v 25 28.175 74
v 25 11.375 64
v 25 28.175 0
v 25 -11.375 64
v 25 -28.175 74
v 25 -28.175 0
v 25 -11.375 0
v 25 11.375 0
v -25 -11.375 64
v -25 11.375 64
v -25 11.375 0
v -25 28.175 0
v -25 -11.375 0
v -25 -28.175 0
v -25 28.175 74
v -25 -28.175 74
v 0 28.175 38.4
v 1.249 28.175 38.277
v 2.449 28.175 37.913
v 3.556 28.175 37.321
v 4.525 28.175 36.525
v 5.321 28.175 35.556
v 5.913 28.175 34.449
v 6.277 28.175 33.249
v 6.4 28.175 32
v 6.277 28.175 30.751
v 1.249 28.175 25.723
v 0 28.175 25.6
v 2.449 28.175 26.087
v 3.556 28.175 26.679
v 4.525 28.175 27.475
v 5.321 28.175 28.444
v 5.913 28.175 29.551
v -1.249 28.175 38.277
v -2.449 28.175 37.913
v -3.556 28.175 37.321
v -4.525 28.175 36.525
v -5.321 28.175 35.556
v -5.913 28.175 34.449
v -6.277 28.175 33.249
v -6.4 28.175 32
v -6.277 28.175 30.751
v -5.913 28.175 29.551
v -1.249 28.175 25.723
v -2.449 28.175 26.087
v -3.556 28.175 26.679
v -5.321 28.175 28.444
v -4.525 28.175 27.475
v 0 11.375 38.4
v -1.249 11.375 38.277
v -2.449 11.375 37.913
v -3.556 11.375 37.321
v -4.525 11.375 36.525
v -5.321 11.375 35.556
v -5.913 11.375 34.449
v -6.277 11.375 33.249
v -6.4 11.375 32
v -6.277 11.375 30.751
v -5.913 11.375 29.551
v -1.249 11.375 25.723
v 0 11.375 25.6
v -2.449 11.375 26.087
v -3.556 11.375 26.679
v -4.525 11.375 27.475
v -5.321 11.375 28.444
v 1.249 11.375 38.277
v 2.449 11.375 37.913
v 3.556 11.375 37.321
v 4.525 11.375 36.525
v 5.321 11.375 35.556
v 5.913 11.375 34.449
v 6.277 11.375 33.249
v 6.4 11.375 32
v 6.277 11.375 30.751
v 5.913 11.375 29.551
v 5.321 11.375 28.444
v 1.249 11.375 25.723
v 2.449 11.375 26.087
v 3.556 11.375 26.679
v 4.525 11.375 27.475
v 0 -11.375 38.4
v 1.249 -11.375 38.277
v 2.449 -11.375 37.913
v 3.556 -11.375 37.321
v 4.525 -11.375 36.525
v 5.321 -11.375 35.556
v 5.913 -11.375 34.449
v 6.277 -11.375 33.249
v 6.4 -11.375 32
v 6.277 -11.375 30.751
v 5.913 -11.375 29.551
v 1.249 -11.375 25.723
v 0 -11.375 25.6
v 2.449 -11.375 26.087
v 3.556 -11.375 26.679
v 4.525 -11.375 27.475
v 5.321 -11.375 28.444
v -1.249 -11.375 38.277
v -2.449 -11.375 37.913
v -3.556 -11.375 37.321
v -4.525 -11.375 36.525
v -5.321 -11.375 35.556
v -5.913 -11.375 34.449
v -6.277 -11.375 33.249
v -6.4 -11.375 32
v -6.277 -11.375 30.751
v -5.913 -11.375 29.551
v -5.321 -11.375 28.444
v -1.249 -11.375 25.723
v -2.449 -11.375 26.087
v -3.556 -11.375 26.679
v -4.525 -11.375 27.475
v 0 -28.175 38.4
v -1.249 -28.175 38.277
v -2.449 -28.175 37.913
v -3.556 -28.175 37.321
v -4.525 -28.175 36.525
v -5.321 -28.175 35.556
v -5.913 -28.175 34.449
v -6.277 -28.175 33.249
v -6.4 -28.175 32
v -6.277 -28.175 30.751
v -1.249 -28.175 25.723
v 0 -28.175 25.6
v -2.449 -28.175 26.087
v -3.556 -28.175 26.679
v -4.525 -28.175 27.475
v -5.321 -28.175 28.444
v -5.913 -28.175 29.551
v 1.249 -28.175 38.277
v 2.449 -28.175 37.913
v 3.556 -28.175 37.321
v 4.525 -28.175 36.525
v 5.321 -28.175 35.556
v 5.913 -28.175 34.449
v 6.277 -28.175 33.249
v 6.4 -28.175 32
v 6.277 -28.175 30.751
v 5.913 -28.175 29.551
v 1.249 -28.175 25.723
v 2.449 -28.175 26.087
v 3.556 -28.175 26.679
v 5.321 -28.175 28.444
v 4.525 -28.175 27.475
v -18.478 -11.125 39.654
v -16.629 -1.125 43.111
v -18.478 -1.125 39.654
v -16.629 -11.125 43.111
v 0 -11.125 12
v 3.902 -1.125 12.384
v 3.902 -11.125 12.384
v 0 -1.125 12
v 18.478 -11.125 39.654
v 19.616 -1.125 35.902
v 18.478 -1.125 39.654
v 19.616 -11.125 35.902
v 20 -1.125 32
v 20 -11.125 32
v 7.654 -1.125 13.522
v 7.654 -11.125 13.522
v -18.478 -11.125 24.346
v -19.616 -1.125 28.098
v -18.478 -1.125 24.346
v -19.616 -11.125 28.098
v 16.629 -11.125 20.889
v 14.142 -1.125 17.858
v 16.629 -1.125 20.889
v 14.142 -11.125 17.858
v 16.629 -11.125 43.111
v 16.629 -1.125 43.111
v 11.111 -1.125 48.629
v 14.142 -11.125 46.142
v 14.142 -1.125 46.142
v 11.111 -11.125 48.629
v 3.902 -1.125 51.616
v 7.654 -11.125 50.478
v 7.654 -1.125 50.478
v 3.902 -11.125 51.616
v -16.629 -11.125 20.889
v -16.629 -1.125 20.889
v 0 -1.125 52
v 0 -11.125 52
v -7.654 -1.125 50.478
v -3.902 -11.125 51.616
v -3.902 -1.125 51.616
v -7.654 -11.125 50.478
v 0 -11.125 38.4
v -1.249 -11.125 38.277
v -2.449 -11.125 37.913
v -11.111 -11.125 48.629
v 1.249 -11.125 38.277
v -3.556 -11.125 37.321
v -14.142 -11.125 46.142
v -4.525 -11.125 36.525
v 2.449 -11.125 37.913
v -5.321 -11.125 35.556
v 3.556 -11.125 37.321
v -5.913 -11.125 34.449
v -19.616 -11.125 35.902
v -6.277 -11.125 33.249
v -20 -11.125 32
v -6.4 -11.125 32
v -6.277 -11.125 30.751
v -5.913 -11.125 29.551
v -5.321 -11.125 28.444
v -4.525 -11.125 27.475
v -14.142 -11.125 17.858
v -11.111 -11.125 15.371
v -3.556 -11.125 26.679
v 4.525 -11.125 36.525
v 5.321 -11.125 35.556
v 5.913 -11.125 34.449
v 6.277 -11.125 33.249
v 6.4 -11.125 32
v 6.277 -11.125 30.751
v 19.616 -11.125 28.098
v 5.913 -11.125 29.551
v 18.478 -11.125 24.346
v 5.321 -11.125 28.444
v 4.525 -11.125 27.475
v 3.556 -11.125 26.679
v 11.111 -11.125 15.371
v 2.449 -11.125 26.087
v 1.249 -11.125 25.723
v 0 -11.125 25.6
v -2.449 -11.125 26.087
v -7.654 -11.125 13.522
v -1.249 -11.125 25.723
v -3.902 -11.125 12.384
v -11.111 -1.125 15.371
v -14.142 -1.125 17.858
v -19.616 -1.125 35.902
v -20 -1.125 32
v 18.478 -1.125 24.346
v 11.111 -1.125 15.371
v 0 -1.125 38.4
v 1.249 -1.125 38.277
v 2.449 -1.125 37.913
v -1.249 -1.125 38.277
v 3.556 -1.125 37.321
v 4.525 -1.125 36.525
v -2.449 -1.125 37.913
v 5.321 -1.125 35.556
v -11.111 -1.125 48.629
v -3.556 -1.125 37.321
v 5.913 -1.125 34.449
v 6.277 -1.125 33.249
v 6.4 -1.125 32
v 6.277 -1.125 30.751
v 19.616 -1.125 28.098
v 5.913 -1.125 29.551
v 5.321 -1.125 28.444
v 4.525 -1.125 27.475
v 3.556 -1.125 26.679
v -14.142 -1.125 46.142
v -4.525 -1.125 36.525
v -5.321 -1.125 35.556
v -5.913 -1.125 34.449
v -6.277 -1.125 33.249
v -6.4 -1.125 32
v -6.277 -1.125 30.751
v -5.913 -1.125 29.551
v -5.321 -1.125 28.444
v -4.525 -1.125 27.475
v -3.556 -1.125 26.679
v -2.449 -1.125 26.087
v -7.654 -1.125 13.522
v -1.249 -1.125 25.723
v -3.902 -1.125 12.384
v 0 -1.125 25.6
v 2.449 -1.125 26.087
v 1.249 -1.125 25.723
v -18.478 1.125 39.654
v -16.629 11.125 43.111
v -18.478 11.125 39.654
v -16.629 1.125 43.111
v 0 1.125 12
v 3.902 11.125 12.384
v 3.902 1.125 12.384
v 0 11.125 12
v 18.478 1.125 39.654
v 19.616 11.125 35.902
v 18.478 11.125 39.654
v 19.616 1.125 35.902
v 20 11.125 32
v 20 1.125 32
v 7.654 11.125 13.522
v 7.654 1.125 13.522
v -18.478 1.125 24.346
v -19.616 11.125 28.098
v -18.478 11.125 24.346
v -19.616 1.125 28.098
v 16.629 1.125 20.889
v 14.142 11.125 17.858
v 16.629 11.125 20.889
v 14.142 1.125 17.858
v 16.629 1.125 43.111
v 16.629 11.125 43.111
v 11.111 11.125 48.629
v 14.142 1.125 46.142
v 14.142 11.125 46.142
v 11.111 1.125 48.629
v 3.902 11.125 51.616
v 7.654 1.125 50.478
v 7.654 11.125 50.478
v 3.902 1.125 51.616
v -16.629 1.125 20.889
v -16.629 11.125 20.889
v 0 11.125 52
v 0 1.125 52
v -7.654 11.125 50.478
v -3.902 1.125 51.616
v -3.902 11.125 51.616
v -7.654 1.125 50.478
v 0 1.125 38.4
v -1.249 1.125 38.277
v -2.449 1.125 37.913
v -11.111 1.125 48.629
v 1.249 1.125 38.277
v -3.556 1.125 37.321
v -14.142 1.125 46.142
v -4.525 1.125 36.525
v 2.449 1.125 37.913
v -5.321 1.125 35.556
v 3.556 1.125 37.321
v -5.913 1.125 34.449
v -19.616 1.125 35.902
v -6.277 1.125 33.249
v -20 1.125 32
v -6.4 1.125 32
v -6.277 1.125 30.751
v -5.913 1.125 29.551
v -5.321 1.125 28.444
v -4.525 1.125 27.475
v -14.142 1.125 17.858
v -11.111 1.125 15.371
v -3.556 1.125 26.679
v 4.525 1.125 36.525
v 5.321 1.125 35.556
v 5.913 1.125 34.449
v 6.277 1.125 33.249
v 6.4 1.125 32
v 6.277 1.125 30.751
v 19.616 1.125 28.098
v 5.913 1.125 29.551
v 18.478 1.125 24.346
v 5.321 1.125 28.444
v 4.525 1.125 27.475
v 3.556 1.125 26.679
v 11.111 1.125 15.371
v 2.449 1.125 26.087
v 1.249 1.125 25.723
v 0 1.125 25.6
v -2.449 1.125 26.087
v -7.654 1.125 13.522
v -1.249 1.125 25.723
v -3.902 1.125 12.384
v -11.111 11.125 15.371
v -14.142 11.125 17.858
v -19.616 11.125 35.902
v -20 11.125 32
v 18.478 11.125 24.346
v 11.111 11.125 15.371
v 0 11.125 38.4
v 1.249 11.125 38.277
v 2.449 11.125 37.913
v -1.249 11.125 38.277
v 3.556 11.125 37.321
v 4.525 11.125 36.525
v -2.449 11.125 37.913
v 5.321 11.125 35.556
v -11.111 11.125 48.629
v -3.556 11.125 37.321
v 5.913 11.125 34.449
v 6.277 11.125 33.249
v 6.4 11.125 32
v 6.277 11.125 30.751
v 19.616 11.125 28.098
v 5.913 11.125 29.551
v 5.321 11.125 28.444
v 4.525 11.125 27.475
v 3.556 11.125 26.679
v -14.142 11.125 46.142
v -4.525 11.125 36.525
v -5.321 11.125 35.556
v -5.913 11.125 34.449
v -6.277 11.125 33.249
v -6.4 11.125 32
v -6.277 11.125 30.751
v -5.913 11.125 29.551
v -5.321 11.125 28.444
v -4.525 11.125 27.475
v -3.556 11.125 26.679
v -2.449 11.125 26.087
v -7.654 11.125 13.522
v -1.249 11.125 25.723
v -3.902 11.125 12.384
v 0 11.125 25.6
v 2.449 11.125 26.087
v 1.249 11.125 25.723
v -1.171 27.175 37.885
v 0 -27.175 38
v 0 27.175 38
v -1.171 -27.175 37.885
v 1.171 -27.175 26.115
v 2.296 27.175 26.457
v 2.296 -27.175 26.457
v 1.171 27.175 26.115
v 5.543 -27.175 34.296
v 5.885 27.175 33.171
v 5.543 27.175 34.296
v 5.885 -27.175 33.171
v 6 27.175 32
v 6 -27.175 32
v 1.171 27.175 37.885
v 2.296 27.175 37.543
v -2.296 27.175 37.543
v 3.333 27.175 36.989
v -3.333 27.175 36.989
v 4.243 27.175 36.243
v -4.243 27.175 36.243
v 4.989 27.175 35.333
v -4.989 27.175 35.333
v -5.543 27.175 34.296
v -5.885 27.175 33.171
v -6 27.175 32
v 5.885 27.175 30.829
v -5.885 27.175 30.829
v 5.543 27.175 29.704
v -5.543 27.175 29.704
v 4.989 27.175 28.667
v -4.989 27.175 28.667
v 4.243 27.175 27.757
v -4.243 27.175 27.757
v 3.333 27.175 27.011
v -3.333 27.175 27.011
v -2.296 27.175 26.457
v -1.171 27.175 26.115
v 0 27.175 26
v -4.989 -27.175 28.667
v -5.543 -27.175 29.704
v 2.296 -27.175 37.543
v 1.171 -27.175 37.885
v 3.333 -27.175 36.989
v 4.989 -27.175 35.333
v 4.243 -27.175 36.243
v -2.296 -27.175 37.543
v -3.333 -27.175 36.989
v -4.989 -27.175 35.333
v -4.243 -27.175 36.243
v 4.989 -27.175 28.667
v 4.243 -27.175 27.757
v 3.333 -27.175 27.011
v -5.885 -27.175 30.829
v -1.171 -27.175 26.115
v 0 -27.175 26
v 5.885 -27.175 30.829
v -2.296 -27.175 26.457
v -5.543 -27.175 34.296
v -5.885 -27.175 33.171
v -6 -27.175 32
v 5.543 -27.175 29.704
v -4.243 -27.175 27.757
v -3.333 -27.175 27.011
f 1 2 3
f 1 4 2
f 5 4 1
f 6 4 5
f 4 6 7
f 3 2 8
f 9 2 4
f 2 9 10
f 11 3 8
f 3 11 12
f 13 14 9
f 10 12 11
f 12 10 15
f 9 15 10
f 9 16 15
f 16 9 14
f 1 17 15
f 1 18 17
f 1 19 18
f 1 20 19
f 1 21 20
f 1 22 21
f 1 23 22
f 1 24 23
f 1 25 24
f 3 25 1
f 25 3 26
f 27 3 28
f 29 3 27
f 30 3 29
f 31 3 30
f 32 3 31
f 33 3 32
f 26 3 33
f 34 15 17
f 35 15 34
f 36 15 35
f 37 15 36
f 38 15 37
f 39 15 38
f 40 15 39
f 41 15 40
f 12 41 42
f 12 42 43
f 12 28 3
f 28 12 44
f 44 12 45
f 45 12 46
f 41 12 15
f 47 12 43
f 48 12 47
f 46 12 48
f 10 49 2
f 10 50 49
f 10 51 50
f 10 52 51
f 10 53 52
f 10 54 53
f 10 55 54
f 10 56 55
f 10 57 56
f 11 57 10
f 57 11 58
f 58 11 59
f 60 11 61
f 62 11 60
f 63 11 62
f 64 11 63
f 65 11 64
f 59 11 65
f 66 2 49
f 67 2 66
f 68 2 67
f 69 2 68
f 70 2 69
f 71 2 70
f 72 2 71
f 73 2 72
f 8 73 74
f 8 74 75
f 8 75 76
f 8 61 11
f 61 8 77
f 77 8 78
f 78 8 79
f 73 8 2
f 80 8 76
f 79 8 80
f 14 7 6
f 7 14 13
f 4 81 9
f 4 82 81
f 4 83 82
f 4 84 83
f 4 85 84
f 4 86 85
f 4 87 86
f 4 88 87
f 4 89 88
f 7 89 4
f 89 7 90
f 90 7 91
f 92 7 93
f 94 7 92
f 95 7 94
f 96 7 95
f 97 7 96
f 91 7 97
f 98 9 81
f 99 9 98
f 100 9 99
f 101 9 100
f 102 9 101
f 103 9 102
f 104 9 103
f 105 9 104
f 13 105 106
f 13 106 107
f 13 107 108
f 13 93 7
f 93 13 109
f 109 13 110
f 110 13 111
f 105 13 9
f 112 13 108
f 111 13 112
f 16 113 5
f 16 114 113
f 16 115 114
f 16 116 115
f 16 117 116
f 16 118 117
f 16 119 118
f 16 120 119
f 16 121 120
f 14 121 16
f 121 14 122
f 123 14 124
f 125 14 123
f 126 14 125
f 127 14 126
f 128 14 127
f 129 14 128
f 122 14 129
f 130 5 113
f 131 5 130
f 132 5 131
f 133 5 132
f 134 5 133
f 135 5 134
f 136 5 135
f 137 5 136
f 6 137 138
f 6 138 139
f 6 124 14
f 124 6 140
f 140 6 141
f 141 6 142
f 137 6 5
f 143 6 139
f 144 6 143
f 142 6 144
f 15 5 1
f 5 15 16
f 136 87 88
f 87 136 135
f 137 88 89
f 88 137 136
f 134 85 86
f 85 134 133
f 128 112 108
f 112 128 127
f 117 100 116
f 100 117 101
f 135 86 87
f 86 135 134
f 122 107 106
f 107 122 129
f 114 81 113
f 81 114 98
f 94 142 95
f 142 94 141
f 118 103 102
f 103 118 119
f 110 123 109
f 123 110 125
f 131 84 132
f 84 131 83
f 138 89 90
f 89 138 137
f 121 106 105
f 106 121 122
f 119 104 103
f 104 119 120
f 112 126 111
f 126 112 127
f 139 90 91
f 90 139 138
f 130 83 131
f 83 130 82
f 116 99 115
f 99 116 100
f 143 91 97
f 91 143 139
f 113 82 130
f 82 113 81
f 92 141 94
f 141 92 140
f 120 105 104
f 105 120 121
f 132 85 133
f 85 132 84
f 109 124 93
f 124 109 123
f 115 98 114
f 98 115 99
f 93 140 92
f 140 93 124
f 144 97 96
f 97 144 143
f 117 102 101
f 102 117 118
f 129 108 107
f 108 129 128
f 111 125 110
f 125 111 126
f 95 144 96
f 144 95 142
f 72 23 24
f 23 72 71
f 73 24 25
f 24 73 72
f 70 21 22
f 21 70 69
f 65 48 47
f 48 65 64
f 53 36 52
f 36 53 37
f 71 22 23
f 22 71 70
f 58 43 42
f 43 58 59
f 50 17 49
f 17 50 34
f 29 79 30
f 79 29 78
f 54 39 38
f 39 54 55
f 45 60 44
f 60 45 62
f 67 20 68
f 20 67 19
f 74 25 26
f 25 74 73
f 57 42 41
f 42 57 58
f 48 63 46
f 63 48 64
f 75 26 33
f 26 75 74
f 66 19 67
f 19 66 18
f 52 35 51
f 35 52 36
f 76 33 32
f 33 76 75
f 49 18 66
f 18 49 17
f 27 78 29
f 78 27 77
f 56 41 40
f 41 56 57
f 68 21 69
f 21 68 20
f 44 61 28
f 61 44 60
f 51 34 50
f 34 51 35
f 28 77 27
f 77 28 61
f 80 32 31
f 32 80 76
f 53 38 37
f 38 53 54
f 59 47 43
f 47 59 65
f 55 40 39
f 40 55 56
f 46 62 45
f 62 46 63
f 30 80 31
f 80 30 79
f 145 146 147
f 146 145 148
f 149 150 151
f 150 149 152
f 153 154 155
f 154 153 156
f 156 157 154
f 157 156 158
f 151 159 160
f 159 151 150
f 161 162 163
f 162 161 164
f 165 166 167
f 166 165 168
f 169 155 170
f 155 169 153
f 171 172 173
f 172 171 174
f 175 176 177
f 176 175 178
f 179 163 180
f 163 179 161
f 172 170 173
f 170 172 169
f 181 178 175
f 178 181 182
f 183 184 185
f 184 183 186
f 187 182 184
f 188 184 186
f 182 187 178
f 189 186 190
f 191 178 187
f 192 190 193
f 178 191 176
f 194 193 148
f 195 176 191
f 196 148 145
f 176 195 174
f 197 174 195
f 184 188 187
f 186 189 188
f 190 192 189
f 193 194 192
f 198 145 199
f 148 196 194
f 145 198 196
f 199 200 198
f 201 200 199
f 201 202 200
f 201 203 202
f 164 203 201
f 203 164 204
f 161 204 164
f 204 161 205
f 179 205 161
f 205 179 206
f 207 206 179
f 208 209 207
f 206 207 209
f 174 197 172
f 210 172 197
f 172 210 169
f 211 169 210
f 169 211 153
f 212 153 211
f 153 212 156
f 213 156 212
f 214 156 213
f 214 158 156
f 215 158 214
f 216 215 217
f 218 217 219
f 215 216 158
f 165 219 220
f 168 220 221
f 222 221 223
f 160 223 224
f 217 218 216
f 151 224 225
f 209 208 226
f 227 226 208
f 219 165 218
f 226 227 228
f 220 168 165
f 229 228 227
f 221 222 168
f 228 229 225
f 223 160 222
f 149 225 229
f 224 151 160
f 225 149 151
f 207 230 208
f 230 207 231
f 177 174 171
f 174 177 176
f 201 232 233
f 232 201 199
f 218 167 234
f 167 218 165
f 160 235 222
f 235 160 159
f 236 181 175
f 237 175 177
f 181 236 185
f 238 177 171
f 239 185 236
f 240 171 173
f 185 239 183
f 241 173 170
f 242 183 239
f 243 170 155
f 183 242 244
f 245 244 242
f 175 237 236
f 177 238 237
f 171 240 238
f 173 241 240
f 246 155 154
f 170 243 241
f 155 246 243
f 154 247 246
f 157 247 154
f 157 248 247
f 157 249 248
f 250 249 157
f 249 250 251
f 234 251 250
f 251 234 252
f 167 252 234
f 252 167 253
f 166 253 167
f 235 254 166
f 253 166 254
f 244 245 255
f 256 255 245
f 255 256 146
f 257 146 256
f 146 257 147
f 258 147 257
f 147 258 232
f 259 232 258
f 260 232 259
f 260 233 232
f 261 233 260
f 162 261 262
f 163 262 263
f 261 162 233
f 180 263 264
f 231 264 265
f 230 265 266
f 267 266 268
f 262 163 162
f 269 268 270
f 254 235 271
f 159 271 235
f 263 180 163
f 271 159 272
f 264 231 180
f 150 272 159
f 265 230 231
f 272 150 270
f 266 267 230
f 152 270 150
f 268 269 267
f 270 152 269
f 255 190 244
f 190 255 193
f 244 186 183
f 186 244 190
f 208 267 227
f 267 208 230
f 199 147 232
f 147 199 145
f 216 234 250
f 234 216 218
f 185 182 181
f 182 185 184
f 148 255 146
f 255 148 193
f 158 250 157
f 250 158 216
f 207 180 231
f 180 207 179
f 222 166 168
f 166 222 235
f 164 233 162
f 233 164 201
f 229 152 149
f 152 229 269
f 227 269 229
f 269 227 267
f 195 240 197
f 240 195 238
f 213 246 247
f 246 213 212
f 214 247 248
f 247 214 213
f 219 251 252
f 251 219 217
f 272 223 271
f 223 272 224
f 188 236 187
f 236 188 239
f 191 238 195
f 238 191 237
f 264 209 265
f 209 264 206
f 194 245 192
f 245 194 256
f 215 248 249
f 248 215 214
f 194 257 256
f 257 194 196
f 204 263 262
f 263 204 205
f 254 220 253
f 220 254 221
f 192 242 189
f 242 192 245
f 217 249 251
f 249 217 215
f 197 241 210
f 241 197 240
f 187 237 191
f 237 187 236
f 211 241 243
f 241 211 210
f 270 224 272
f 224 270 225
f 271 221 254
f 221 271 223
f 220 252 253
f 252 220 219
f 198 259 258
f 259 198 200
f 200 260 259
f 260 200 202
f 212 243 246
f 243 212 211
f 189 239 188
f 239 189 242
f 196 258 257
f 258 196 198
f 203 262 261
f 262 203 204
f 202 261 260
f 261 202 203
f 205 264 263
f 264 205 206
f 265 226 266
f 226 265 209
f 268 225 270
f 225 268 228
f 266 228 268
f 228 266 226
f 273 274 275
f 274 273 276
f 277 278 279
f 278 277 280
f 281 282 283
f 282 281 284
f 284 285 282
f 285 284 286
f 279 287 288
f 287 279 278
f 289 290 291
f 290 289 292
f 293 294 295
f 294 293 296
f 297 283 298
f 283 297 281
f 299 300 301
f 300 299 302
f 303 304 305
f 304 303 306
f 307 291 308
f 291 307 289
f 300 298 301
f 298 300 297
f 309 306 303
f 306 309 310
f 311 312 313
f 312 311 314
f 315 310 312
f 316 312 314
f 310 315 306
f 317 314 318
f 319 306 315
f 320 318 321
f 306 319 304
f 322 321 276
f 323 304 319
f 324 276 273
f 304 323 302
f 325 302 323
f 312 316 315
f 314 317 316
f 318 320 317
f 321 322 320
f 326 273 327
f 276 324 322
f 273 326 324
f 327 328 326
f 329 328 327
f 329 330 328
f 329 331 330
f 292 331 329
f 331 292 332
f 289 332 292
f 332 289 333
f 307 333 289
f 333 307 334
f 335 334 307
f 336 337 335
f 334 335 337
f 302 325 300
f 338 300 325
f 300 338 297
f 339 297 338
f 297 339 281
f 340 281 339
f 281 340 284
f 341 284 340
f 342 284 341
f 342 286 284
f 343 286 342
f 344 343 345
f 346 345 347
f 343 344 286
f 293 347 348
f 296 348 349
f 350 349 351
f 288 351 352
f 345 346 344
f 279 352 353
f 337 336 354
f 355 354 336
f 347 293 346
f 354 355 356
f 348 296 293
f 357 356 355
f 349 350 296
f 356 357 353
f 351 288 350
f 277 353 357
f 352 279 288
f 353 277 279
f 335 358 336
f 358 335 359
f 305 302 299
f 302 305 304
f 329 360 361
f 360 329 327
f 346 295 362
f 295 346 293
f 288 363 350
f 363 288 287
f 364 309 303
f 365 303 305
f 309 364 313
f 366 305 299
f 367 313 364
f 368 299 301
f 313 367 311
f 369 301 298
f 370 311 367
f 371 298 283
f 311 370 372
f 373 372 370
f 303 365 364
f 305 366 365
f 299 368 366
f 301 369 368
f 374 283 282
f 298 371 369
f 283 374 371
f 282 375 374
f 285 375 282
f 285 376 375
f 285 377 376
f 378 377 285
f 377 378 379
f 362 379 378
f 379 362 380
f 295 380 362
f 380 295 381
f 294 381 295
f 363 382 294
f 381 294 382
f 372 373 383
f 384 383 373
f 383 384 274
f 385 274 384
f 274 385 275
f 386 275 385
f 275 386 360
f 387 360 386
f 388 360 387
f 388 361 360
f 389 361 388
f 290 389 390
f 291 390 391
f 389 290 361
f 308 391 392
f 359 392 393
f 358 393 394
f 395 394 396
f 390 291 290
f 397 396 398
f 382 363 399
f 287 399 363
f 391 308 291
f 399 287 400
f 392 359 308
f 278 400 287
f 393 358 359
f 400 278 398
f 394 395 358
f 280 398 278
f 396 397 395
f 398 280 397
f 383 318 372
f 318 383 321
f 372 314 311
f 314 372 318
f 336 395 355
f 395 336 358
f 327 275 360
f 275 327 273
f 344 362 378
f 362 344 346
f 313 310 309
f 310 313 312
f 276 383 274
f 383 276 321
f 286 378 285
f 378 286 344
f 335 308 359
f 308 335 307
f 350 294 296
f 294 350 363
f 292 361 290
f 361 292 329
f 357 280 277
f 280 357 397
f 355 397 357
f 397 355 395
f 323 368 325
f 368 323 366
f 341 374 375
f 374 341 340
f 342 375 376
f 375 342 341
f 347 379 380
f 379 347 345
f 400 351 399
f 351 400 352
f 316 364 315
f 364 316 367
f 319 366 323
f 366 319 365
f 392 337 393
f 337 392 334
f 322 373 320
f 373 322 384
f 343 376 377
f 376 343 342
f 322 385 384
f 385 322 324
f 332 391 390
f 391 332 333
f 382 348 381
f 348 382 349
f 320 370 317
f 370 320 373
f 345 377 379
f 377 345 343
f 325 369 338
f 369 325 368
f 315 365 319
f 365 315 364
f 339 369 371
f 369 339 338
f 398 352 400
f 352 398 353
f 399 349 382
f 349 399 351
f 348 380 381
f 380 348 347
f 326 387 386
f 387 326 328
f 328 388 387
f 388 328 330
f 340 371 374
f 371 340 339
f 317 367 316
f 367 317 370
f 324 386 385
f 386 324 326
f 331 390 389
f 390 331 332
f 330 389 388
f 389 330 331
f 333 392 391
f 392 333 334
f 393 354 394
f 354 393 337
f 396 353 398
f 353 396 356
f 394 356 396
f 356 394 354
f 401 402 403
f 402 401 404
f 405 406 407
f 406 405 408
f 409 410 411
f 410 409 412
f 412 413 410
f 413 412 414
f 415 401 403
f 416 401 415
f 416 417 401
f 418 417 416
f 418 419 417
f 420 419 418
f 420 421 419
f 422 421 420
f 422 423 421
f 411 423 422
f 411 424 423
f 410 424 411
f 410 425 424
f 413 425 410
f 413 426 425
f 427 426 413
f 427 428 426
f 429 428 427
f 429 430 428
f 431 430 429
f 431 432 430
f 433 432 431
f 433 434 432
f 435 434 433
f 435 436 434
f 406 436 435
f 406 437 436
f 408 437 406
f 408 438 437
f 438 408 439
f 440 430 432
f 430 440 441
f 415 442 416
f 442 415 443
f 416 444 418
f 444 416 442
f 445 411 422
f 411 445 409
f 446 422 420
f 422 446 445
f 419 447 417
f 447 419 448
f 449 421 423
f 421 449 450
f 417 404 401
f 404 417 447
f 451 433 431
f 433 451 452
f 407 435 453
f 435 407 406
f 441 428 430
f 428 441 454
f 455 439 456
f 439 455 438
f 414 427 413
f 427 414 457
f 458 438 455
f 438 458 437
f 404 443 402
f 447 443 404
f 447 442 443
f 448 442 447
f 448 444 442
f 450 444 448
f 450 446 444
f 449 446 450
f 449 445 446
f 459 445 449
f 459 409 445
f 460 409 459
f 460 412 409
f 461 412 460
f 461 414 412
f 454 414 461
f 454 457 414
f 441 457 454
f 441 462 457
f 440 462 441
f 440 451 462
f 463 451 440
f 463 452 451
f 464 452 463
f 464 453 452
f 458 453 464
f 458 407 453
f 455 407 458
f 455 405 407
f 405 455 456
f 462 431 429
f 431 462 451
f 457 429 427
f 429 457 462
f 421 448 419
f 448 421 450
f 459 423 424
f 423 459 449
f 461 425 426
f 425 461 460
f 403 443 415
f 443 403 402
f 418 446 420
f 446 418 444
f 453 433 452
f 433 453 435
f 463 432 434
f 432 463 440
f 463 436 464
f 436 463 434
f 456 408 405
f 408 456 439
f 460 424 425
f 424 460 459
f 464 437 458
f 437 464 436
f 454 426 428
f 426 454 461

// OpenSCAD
$fn = 32;

// ------------------------------------------------------------------------
// Trolley wheel set: wheels d40, fork 64 mm tall
// Every part is its own module, assembly() places every instance.
// ------------------------------------------------------------------------

// --- part 1 ---
module trolley_fork() {
  difference() {
    union() {
      translate([-25, 11.375, 0]) cube([50, 16.8, 64]);
      translate([-25, -28.175, 0]) cube([50, 16.8, 64]);
      translate([-25, -28.175, 64]) cube([50, 56.35, 10]);
    }
    translate([0, -19.775, 32]) rotate([90, 0, 0]) cylinder(h = 18.8, d = 12.8, center = true);
    translate([0, 19.775, 32]) rotate([90, 0, 0]) cylinder(h = 18.8, d = 12.8, center = true);
  }
}

// --- part 2 ---
module trolley_wheel() {
  difference() {
      translate([0, 0, 0]) cylinder(h = 10, d = 40);
      translate([0, 0, -1]) cylinder(h = 12, d = 12.8);
    }
}

// --- part 3 ---
module trolley_axle() {
  translate([0, 0, -27.175]) cylinder(h = 54.35, d = 12);
}

// --- assembly ---
module assembly() {
  color([0.80, 0.24, 0.20]) translate([0, 0, 0]) rotate([0, 0, 0]) trolley_fork();
  color([0.20, 0.45, 0.75]) translate([0, -1.125, 32]) rotate([90, 0, 0]) trolley_wheel();
  color([0.25, 0.62, 0.32]) translate([0, 11.125, 32]) rotate([90, 0, 0]) trolley_wheel();
  color([0.92, 0.70, 0.18]) translate([0, 0, 32]) rotate([90, 0, 0]) trolley_axle();
}

assembly();
